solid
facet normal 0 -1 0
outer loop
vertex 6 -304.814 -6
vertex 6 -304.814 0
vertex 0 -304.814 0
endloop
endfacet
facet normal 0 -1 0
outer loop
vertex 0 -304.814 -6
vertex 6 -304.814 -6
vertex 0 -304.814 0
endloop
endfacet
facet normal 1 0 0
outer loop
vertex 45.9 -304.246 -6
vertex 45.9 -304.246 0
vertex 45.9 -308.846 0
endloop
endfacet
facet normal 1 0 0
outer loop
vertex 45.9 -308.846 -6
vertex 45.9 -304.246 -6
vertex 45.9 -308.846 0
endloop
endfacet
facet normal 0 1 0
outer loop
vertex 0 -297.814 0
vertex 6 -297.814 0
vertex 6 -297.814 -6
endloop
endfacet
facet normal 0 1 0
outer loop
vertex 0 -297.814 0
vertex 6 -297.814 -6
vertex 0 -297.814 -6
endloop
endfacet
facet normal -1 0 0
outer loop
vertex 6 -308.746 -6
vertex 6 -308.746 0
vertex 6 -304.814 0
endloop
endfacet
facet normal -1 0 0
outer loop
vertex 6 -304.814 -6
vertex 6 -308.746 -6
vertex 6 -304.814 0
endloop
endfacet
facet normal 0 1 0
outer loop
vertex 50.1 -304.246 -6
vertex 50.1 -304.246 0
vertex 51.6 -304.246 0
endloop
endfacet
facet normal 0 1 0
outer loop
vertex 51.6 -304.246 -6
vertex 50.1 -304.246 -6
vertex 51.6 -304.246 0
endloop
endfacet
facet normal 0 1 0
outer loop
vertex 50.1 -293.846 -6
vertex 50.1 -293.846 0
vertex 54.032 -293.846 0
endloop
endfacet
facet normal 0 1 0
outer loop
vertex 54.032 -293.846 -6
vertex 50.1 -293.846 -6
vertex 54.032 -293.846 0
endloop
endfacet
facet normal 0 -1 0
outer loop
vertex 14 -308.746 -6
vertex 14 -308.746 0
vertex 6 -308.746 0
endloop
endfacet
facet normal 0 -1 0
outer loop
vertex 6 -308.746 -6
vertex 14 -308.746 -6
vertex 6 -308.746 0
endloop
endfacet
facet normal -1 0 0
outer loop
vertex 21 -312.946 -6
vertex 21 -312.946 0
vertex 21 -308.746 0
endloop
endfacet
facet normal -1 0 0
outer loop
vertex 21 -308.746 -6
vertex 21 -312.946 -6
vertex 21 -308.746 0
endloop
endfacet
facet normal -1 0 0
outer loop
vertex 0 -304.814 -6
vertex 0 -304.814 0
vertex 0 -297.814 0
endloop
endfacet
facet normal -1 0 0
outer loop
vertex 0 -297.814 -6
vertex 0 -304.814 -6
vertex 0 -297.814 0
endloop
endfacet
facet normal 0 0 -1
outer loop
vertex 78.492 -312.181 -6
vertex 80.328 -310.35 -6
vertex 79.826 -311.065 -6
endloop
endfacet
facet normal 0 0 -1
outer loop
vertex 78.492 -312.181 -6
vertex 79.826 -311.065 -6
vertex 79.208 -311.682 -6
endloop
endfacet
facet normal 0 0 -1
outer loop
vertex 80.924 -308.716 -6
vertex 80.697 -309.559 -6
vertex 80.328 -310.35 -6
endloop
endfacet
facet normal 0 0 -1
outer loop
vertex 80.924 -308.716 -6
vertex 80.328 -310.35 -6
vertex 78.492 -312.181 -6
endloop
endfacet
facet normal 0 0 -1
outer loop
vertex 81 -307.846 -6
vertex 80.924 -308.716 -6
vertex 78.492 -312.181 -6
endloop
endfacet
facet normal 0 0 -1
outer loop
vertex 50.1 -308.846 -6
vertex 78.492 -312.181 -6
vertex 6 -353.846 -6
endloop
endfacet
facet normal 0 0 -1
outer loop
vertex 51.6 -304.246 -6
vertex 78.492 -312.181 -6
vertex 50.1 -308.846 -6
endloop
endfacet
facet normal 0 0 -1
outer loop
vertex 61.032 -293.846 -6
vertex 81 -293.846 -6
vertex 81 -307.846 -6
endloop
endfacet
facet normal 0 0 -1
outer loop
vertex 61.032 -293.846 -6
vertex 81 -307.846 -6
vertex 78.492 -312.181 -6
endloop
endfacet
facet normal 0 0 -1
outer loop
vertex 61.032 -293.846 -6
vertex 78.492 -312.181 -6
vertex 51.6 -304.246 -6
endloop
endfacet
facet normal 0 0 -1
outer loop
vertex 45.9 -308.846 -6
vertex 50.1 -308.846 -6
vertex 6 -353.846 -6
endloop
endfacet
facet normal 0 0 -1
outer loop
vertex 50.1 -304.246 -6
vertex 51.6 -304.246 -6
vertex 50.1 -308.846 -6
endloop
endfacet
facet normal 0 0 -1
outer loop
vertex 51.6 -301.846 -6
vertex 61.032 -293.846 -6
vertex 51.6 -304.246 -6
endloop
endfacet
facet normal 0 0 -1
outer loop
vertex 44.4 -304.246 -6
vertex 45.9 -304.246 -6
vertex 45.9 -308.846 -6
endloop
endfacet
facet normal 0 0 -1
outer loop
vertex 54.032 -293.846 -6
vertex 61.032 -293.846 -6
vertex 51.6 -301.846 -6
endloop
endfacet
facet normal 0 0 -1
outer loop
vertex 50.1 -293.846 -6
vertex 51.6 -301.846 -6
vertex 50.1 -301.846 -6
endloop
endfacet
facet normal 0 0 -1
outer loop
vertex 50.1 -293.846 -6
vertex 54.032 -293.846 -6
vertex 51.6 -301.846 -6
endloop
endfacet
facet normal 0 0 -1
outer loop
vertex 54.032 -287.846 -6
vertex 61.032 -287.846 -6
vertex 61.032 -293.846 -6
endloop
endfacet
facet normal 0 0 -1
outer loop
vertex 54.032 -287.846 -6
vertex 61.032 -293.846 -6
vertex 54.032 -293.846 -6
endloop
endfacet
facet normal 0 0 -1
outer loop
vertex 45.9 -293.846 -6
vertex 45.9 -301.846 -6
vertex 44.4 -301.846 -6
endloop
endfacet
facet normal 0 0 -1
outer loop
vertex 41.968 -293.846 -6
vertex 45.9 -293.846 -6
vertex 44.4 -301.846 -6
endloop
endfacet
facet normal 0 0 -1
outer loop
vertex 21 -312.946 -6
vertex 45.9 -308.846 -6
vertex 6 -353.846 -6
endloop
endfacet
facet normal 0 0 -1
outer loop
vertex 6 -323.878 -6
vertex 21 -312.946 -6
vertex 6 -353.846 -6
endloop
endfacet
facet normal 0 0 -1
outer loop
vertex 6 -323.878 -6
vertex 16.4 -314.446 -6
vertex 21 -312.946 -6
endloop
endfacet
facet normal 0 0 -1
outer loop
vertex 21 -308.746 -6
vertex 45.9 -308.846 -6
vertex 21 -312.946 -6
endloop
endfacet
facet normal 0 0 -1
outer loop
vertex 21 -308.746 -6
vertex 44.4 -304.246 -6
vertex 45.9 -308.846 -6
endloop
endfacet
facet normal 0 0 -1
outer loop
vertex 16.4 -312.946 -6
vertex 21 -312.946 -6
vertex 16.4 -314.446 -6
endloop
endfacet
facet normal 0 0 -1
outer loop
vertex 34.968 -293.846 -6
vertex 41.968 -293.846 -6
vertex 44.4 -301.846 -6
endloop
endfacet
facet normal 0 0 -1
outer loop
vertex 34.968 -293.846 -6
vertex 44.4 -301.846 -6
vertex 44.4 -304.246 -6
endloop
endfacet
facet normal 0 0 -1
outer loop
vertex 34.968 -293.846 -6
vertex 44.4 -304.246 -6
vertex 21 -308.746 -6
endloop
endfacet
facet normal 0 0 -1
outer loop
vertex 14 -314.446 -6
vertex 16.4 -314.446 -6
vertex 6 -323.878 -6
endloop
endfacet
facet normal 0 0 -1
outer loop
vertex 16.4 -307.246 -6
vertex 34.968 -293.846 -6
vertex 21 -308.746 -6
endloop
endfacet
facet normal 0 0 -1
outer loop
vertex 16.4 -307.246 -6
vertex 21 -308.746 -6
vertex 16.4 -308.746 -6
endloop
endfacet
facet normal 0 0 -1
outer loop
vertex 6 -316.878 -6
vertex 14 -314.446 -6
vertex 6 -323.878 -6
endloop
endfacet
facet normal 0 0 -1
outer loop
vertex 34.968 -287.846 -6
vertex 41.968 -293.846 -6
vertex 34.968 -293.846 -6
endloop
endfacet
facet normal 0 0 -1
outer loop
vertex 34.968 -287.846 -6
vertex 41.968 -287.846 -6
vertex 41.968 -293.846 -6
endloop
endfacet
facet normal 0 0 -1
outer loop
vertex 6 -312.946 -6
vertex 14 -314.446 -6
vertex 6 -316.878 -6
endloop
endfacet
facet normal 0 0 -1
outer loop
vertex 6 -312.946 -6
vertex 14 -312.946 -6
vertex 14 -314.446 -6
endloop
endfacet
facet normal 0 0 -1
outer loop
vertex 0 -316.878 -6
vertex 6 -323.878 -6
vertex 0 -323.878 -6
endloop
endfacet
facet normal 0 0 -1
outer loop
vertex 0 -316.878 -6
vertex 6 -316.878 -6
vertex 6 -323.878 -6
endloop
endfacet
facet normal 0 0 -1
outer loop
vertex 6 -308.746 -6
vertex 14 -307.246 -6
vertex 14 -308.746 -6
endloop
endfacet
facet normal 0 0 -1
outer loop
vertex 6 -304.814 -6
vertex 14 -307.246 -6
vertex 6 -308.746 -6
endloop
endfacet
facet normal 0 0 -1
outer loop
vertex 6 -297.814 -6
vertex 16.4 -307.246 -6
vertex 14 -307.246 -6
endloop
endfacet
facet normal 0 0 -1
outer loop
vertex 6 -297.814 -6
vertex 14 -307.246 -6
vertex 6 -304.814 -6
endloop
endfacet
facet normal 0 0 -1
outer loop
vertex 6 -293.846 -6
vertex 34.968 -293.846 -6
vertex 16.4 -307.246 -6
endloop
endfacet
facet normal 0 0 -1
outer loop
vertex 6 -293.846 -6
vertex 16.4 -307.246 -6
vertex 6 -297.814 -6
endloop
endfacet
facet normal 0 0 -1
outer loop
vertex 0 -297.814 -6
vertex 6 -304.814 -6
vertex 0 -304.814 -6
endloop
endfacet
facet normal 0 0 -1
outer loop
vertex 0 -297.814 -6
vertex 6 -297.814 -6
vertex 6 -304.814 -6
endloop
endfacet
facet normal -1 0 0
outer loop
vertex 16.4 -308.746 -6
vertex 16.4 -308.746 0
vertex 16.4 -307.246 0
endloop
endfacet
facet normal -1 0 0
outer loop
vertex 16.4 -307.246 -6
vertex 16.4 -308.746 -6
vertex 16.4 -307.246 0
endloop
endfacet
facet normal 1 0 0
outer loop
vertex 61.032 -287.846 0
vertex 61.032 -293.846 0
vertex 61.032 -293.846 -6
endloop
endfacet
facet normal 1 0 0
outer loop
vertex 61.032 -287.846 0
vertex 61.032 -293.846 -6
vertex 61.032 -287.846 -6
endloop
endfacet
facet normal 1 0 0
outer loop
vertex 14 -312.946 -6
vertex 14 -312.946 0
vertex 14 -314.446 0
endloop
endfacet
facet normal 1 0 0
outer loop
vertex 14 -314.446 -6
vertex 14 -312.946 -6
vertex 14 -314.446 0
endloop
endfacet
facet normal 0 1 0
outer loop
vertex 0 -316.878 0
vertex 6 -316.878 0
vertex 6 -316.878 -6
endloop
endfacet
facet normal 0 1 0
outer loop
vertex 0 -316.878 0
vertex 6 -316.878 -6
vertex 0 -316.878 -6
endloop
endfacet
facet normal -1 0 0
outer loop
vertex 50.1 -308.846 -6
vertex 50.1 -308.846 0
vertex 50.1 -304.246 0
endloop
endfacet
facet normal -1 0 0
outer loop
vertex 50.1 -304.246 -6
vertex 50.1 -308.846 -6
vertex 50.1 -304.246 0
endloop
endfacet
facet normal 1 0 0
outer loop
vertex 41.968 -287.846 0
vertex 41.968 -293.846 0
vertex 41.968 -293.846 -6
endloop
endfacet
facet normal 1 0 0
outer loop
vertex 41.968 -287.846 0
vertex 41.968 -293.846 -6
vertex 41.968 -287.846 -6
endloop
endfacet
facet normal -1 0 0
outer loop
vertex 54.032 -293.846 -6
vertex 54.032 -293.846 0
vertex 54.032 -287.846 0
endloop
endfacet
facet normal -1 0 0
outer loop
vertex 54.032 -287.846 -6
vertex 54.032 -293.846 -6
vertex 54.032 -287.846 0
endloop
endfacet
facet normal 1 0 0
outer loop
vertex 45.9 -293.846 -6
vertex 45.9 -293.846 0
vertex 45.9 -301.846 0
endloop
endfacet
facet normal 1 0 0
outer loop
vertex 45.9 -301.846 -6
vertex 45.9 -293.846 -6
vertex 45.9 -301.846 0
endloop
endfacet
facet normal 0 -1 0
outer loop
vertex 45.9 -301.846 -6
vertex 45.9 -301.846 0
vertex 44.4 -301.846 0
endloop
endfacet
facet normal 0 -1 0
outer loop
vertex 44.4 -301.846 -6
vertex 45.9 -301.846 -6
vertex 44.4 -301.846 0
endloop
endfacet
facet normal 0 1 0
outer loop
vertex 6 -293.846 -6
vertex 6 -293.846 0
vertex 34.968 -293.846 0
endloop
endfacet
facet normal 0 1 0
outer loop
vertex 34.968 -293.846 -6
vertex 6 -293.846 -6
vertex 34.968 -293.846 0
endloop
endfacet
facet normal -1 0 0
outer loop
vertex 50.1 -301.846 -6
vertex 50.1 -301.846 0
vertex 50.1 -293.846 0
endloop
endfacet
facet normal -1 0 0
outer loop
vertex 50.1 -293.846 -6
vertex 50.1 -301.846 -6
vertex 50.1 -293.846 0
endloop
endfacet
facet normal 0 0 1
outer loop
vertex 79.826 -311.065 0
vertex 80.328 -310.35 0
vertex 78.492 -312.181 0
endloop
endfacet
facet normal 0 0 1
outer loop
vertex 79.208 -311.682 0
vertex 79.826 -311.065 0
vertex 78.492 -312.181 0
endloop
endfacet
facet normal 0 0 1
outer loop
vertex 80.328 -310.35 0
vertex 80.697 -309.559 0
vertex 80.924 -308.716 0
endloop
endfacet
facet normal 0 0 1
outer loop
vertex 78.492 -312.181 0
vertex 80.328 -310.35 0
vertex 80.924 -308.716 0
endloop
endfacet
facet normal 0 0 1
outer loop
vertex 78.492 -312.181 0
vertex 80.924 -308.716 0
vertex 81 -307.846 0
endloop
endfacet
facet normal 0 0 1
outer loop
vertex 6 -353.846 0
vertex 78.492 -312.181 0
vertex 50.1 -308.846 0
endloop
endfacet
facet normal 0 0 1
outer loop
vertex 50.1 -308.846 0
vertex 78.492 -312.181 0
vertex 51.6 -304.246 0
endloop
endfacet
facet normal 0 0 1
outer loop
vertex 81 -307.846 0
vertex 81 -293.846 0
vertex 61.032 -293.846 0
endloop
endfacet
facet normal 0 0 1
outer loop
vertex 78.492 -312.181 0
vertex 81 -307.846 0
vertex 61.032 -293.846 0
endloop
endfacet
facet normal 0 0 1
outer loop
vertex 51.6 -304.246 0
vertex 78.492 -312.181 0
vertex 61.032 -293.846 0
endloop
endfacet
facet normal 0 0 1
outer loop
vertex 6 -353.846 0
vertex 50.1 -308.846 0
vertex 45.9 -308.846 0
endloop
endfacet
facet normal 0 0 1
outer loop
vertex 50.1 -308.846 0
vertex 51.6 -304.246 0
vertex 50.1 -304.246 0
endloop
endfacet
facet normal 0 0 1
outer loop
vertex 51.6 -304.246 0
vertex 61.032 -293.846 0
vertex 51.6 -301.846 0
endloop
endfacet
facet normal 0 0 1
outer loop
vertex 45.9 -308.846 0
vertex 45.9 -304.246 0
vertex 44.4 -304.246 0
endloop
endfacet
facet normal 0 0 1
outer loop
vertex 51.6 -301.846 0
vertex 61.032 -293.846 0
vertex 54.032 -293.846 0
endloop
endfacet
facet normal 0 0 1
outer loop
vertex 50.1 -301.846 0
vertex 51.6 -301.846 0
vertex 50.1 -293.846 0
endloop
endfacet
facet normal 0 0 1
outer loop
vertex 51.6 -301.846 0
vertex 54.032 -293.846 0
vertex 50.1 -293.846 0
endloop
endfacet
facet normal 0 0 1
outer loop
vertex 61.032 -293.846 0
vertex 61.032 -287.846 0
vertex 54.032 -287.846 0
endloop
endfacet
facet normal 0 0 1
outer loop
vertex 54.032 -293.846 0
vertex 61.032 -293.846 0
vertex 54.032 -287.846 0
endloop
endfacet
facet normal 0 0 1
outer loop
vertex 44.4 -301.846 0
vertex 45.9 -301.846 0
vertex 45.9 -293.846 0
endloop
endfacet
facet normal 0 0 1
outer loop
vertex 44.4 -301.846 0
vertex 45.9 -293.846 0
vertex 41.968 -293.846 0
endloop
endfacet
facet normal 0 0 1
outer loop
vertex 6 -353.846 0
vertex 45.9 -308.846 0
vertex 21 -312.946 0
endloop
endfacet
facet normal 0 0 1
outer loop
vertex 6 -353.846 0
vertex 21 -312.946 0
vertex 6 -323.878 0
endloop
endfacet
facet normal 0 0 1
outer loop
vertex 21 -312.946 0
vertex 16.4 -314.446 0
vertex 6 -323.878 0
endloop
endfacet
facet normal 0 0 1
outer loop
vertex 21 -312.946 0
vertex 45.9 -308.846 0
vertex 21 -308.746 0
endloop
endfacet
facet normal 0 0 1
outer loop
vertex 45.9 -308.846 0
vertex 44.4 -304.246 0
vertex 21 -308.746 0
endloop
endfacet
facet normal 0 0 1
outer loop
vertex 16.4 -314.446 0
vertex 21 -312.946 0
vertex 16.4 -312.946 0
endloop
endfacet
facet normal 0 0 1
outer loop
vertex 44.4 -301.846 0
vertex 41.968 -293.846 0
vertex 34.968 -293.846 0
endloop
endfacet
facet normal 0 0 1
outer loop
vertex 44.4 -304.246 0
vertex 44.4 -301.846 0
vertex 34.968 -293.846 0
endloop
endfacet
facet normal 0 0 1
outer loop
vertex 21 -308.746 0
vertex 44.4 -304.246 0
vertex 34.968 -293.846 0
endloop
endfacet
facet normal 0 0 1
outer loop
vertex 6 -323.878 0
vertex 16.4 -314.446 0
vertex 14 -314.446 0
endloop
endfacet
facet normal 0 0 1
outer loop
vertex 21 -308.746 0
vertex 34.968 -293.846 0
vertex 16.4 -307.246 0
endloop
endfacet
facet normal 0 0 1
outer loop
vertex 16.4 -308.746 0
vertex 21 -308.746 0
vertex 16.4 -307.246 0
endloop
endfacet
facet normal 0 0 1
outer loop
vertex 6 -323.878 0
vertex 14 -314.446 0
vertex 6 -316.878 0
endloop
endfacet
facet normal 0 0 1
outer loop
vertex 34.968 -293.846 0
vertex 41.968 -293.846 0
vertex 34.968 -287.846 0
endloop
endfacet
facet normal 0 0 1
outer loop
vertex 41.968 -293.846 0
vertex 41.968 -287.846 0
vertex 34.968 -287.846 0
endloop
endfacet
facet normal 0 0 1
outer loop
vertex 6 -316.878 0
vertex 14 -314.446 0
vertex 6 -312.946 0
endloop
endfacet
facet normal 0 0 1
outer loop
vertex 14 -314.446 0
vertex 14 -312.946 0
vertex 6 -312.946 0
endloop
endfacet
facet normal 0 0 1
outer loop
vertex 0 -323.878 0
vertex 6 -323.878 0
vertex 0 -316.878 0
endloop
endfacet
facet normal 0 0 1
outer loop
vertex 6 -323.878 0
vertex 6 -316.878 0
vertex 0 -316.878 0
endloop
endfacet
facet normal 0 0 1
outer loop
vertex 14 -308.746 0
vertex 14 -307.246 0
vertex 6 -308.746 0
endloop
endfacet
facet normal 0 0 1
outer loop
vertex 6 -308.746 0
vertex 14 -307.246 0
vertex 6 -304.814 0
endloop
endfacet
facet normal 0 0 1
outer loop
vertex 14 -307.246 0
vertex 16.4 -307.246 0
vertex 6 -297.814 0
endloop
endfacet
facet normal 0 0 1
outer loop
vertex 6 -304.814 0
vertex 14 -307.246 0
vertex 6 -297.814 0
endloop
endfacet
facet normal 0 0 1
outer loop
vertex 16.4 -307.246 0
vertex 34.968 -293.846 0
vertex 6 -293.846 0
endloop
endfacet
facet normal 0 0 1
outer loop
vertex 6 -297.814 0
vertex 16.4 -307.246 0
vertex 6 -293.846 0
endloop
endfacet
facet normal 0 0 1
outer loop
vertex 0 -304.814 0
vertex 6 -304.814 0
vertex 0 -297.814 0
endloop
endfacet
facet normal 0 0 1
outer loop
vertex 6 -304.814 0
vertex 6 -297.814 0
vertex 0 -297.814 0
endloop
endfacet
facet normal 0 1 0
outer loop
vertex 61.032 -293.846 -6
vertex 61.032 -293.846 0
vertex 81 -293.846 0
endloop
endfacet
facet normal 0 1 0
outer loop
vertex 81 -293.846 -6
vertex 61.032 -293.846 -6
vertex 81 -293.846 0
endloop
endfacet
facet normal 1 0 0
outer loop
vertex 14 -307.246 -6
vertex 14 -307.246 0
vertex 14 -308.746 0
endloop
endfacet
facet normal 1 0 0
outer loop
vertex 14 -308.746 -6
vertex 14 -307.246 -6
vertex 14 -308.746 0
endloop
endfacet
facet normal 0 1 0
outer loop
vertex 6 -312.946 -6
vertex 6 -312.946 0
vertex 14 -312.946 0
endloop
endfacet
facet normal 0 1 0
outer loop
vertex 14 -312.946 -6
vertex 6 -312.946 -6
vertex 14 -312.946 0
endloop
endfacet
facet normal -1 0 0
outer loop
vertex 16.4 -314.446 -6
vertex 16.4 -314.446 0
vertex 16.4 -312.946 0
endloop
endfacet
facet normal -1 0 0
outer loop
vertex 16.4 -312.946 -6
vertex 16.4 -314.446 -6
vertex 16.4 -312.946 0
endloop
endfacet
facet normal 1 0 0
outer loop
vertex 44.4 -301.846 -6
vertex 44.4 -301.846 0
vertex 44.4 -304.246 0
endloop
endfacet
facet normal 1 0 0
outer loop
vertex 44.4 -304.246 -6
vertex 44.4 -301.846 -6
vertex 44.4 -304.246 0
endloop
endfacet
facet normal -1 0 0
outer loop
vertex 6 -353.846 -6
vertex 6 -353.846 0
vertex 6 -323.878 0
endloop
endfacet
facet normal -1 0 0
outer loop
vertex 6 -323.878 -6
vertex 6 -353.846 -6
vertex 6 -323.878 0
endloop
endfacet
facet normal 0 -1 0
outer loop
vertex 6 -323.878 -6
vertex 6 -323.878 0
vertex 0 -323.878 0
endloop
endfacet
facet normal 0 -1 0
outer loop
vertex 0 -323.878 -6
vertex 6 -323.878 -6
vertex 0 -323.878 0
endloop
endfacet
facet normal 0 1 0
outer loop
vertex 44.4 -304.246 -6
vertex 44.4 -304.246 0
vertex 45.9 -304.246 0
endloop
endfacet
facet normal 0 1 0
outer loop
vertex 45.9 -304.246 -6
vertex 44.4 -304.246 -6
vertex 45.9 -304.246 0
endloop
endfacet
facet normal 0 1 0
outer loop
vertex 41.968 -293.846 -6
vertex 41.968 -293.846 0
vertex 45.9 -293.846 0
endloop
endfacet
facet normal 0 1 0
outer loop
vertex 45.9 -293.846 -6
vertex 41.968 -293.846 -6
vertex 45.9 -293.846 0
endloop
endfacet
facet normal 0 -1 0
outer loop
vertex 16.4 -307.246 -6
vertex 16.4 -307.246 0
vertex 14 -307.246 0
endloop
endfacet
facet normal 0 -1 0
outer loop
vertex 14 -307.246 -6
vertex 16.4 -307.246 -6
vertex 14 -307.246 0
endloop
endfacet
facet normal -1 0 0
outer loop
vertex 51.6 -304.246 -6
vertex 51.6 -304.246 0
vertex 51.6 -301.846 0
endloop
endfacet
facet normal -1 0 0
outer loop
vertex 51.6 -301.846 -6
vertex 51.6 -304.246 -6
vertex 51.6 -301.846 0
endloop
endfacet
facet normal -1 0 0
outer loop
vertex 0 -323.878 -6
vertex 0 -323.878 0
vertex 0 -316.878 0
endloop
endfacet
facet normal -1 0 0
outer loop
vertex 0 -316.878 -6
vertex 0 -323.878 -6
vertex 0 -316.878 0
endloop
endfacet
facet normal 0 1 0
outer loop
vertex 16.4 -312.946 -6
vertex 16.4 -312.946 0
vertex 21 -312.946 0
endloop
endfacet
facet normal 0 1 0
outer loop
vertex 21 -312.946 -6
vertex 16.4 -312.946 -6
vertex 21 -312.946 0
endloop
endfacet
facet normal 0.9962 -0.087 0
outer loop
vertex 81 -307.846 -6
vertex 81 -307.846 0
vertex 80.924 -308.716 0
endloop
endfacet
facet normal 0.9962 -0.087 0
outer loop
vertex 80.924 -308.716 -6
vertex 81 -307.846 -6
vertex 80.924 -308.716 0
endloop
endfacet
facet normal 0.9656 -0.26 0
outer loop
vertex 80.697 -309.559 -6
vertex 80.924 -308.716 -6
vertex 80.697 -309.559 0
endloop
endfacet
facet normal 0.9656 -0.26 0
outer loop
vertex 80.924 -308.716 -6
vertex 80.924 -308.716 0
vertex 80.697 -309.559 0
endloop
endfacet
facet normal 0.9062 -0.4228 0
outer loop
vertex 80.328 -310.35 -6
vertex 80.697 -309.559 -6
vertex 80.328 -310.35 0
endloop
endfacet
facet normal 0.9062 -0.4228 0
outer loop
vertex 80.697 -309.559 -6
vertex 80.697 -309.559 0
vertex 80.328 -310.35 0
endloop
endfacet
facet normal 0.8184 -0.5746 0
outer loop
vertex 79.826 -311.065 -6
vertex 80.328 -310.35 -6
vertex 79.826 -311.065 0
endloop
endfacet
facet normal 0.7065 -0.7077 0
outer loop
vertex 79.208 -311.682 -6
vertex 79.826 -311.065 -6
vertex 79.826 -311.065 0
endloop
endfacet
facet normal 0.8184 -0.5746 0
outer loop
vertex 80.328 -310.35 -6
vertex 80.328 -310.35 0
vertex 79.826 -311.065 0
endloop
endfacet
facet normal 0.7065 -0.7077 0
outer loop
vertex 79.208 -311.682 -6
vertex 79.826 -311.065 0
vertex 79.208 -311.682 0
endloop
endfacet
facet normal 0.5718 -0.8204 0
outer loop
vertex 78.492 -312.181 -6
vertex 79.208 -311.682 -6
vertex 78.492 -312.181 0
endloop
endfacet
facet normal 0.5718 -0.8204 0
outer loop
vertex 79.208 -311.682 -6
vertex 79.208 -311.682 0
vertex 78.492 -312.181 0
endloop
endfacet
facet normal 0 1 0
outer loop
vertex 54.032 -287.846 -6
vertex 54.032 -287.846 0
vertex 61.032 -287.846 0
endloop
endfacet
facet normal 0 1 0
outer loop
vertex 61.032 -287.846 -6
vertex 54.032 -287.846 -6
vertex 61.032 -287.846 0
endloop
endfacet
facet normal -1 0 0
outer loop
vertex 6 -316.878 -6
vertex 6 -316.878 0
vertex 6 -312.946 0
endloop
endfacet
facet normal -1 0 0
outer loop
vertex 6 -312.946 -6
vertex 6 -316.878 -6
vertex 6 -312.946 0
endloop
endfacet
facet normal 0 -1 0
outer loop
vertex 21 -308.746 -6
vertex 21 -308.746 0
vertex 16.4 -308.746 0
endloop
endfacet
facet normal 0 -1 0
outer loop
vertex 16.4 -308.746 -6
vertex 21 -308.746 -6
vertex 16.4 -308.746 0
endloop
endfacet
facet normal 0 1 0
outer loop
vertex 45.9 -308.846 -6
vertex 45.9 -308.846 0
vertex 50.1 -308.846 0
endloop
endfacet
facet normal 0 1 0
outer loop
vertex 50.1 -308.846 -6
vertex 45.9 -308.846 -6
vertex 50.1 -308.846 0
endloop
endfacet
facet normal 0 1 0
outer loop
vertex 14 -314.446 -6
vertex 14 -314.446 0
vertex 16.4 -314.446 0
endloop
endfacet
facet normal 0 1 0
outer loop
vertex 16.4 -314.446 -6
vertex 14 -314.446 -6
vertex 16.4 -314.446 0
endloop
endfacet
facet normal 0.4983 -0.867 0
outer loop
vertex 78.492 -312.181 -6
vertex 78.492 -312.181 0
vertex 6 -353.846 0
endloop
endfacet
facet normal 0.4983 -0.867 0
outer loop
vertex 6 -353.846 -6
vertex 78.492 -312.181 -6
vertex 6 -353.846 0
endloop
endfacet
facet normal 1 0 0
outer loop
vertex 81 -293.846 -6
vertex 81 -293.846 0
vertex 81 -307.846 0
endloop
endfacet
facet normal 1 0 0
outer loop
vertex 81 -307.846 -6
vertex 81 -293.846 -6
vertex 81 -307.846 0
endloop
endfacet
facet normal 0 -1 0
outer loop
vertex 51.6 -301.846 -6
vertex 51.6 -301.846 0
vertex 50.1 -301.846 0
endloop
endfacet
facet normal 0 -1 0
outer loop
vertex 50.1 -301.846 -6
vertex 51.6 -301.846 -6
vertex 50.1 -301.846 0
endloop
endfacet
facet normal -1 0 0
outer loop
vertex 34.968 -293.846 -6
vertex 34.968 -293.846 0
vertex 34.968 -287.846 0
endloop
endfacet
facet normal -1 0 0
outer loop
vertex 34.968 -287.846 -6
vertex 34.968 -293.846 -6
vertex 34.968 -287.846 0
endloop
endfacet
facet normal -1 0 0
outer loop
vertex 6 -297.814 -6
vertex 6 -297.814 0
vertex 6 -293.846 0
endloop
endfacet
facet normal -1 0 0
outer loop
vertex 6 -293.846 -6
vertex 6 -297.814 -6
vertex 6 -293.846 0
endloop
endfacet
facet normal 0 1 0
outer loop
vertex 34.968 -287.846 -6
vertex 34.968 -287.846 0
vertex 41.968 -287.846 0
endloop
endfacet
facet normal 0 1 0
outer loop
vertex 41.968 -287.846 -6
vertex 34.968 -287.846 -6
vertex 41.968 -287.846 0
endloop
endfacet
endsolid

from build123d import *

# Parameters (mm, degrees)
EXTRUDE_1_DEPTH      = 6
SKETCH_2_W           = 7
SKETCH_2_H           = 6
EXTRUDE_2_DEPTH      = 6
CUT_EXTRUDE_1_DEPTH  = 7
SKETCH_21_W          = 7
SKETCH_21_H          = 6
EXTRUDE_21_DEPTH     = 6
CUT_EXTRUDE_11_DEPTH = 7


with BuildPart() as part:
    # Эскиз1 → Бобышка-Вытянуть1 (new body)
    with BuildSketch(Plane.XY):
        with BuildLine():
            Line((81, -293.846153846), (81, -307.846153846))
            ThreePointArc((81, -307.846153846), (80.327690782, -310.350368792), (78.491563001, -312.181141022))
            Line((78.491563001, -312.181141022), (6, -353.846153846))
            Line((6, -353.846153846), (6, -293.846153846))
            Line((6, -293.846153846), (81, -293.846153846))
        make_face()
    extrude(amount=-EXTRUDE_1_DEPTH)

    # Эскиз2 → Бобышка-Вытянуть2 (add)
    with BuildSketch(Plane(origin=(56, -310.846153846, 0), x_dir=(0, 1, 0), z_dir=(0, 0, 1))):
        with Locations((-9.531849908, 53)):
            Rectangle(SKETCH_2_W, SKETCH_2_H)
        with Locations((9.531849908, 53)):
            Rectangle(SKETCH_2_W, SKETCH_2_H)
    extrude(amount=-EXTRUDE_2_DEPTH)

    # Эскиз3 → Вырез-Вытянуть1 (cut, through all)
    with BuildSketch(Plane(origin=(56, -310.846153846, 0), x_dir=(0, 1, 0), z_dir=(0, 0, 1))):
        Polygon((-2.1, 42), (-3.6, 42), (-3.6, 39.6), (-2.1, 39.6), (-2.1, 35), (2.1, 35), (2.1, 39.6), (3.6, 39.6), (3.6, 42), (2.1, 42), (2.1, 50), (-2.1, 50), align=None)
    extrude(amount=-CUT_EXTRUDE_1_DEPTH, mode=Mode.SUBTRACT)

    # Эскиз21 → Бобышка-Вытянуть21 (add)
    with BuildSketch(Plane(origin=(48, -343.846153846, 0), x_dir=(1, 0, 0), z_dir=(0, 0, 1))):
        with Locations((-9.531849908, 53)):
            Rectangle(SKETCH_21_W, SKETCH_21_H)
        with Locations((9.531849908, 53)):
            Rectangle(SKETCH_21_W, SKETCH_21_H)
    extrude(amount=-EXTRUDE_21_DEPTH)

    # Эскиз31 → Вырез-Вытянуть11 (cut, through all)
    with BuildSketch(Plane(origin=(48, -343.846153846, 0), x_dir=(1, 0, 0), z_dir=(0, 0, 1))):
        Polygon((-2.1, 42), (-3.6, 42), (-3.6, 39.6), (-2.1, 39.6), (-2.1, 35), (2.1, 35), (2.1, 39.6), (3.6, 39.6), (3.6, 42), (2.1, 42), (2.1, 50), (-2.1, 50), align=None)
    extrude(amount=-CUT_EXTRUDE_11_DEPTH, mode=Mode.SUBTRACT)


solid = part.part
